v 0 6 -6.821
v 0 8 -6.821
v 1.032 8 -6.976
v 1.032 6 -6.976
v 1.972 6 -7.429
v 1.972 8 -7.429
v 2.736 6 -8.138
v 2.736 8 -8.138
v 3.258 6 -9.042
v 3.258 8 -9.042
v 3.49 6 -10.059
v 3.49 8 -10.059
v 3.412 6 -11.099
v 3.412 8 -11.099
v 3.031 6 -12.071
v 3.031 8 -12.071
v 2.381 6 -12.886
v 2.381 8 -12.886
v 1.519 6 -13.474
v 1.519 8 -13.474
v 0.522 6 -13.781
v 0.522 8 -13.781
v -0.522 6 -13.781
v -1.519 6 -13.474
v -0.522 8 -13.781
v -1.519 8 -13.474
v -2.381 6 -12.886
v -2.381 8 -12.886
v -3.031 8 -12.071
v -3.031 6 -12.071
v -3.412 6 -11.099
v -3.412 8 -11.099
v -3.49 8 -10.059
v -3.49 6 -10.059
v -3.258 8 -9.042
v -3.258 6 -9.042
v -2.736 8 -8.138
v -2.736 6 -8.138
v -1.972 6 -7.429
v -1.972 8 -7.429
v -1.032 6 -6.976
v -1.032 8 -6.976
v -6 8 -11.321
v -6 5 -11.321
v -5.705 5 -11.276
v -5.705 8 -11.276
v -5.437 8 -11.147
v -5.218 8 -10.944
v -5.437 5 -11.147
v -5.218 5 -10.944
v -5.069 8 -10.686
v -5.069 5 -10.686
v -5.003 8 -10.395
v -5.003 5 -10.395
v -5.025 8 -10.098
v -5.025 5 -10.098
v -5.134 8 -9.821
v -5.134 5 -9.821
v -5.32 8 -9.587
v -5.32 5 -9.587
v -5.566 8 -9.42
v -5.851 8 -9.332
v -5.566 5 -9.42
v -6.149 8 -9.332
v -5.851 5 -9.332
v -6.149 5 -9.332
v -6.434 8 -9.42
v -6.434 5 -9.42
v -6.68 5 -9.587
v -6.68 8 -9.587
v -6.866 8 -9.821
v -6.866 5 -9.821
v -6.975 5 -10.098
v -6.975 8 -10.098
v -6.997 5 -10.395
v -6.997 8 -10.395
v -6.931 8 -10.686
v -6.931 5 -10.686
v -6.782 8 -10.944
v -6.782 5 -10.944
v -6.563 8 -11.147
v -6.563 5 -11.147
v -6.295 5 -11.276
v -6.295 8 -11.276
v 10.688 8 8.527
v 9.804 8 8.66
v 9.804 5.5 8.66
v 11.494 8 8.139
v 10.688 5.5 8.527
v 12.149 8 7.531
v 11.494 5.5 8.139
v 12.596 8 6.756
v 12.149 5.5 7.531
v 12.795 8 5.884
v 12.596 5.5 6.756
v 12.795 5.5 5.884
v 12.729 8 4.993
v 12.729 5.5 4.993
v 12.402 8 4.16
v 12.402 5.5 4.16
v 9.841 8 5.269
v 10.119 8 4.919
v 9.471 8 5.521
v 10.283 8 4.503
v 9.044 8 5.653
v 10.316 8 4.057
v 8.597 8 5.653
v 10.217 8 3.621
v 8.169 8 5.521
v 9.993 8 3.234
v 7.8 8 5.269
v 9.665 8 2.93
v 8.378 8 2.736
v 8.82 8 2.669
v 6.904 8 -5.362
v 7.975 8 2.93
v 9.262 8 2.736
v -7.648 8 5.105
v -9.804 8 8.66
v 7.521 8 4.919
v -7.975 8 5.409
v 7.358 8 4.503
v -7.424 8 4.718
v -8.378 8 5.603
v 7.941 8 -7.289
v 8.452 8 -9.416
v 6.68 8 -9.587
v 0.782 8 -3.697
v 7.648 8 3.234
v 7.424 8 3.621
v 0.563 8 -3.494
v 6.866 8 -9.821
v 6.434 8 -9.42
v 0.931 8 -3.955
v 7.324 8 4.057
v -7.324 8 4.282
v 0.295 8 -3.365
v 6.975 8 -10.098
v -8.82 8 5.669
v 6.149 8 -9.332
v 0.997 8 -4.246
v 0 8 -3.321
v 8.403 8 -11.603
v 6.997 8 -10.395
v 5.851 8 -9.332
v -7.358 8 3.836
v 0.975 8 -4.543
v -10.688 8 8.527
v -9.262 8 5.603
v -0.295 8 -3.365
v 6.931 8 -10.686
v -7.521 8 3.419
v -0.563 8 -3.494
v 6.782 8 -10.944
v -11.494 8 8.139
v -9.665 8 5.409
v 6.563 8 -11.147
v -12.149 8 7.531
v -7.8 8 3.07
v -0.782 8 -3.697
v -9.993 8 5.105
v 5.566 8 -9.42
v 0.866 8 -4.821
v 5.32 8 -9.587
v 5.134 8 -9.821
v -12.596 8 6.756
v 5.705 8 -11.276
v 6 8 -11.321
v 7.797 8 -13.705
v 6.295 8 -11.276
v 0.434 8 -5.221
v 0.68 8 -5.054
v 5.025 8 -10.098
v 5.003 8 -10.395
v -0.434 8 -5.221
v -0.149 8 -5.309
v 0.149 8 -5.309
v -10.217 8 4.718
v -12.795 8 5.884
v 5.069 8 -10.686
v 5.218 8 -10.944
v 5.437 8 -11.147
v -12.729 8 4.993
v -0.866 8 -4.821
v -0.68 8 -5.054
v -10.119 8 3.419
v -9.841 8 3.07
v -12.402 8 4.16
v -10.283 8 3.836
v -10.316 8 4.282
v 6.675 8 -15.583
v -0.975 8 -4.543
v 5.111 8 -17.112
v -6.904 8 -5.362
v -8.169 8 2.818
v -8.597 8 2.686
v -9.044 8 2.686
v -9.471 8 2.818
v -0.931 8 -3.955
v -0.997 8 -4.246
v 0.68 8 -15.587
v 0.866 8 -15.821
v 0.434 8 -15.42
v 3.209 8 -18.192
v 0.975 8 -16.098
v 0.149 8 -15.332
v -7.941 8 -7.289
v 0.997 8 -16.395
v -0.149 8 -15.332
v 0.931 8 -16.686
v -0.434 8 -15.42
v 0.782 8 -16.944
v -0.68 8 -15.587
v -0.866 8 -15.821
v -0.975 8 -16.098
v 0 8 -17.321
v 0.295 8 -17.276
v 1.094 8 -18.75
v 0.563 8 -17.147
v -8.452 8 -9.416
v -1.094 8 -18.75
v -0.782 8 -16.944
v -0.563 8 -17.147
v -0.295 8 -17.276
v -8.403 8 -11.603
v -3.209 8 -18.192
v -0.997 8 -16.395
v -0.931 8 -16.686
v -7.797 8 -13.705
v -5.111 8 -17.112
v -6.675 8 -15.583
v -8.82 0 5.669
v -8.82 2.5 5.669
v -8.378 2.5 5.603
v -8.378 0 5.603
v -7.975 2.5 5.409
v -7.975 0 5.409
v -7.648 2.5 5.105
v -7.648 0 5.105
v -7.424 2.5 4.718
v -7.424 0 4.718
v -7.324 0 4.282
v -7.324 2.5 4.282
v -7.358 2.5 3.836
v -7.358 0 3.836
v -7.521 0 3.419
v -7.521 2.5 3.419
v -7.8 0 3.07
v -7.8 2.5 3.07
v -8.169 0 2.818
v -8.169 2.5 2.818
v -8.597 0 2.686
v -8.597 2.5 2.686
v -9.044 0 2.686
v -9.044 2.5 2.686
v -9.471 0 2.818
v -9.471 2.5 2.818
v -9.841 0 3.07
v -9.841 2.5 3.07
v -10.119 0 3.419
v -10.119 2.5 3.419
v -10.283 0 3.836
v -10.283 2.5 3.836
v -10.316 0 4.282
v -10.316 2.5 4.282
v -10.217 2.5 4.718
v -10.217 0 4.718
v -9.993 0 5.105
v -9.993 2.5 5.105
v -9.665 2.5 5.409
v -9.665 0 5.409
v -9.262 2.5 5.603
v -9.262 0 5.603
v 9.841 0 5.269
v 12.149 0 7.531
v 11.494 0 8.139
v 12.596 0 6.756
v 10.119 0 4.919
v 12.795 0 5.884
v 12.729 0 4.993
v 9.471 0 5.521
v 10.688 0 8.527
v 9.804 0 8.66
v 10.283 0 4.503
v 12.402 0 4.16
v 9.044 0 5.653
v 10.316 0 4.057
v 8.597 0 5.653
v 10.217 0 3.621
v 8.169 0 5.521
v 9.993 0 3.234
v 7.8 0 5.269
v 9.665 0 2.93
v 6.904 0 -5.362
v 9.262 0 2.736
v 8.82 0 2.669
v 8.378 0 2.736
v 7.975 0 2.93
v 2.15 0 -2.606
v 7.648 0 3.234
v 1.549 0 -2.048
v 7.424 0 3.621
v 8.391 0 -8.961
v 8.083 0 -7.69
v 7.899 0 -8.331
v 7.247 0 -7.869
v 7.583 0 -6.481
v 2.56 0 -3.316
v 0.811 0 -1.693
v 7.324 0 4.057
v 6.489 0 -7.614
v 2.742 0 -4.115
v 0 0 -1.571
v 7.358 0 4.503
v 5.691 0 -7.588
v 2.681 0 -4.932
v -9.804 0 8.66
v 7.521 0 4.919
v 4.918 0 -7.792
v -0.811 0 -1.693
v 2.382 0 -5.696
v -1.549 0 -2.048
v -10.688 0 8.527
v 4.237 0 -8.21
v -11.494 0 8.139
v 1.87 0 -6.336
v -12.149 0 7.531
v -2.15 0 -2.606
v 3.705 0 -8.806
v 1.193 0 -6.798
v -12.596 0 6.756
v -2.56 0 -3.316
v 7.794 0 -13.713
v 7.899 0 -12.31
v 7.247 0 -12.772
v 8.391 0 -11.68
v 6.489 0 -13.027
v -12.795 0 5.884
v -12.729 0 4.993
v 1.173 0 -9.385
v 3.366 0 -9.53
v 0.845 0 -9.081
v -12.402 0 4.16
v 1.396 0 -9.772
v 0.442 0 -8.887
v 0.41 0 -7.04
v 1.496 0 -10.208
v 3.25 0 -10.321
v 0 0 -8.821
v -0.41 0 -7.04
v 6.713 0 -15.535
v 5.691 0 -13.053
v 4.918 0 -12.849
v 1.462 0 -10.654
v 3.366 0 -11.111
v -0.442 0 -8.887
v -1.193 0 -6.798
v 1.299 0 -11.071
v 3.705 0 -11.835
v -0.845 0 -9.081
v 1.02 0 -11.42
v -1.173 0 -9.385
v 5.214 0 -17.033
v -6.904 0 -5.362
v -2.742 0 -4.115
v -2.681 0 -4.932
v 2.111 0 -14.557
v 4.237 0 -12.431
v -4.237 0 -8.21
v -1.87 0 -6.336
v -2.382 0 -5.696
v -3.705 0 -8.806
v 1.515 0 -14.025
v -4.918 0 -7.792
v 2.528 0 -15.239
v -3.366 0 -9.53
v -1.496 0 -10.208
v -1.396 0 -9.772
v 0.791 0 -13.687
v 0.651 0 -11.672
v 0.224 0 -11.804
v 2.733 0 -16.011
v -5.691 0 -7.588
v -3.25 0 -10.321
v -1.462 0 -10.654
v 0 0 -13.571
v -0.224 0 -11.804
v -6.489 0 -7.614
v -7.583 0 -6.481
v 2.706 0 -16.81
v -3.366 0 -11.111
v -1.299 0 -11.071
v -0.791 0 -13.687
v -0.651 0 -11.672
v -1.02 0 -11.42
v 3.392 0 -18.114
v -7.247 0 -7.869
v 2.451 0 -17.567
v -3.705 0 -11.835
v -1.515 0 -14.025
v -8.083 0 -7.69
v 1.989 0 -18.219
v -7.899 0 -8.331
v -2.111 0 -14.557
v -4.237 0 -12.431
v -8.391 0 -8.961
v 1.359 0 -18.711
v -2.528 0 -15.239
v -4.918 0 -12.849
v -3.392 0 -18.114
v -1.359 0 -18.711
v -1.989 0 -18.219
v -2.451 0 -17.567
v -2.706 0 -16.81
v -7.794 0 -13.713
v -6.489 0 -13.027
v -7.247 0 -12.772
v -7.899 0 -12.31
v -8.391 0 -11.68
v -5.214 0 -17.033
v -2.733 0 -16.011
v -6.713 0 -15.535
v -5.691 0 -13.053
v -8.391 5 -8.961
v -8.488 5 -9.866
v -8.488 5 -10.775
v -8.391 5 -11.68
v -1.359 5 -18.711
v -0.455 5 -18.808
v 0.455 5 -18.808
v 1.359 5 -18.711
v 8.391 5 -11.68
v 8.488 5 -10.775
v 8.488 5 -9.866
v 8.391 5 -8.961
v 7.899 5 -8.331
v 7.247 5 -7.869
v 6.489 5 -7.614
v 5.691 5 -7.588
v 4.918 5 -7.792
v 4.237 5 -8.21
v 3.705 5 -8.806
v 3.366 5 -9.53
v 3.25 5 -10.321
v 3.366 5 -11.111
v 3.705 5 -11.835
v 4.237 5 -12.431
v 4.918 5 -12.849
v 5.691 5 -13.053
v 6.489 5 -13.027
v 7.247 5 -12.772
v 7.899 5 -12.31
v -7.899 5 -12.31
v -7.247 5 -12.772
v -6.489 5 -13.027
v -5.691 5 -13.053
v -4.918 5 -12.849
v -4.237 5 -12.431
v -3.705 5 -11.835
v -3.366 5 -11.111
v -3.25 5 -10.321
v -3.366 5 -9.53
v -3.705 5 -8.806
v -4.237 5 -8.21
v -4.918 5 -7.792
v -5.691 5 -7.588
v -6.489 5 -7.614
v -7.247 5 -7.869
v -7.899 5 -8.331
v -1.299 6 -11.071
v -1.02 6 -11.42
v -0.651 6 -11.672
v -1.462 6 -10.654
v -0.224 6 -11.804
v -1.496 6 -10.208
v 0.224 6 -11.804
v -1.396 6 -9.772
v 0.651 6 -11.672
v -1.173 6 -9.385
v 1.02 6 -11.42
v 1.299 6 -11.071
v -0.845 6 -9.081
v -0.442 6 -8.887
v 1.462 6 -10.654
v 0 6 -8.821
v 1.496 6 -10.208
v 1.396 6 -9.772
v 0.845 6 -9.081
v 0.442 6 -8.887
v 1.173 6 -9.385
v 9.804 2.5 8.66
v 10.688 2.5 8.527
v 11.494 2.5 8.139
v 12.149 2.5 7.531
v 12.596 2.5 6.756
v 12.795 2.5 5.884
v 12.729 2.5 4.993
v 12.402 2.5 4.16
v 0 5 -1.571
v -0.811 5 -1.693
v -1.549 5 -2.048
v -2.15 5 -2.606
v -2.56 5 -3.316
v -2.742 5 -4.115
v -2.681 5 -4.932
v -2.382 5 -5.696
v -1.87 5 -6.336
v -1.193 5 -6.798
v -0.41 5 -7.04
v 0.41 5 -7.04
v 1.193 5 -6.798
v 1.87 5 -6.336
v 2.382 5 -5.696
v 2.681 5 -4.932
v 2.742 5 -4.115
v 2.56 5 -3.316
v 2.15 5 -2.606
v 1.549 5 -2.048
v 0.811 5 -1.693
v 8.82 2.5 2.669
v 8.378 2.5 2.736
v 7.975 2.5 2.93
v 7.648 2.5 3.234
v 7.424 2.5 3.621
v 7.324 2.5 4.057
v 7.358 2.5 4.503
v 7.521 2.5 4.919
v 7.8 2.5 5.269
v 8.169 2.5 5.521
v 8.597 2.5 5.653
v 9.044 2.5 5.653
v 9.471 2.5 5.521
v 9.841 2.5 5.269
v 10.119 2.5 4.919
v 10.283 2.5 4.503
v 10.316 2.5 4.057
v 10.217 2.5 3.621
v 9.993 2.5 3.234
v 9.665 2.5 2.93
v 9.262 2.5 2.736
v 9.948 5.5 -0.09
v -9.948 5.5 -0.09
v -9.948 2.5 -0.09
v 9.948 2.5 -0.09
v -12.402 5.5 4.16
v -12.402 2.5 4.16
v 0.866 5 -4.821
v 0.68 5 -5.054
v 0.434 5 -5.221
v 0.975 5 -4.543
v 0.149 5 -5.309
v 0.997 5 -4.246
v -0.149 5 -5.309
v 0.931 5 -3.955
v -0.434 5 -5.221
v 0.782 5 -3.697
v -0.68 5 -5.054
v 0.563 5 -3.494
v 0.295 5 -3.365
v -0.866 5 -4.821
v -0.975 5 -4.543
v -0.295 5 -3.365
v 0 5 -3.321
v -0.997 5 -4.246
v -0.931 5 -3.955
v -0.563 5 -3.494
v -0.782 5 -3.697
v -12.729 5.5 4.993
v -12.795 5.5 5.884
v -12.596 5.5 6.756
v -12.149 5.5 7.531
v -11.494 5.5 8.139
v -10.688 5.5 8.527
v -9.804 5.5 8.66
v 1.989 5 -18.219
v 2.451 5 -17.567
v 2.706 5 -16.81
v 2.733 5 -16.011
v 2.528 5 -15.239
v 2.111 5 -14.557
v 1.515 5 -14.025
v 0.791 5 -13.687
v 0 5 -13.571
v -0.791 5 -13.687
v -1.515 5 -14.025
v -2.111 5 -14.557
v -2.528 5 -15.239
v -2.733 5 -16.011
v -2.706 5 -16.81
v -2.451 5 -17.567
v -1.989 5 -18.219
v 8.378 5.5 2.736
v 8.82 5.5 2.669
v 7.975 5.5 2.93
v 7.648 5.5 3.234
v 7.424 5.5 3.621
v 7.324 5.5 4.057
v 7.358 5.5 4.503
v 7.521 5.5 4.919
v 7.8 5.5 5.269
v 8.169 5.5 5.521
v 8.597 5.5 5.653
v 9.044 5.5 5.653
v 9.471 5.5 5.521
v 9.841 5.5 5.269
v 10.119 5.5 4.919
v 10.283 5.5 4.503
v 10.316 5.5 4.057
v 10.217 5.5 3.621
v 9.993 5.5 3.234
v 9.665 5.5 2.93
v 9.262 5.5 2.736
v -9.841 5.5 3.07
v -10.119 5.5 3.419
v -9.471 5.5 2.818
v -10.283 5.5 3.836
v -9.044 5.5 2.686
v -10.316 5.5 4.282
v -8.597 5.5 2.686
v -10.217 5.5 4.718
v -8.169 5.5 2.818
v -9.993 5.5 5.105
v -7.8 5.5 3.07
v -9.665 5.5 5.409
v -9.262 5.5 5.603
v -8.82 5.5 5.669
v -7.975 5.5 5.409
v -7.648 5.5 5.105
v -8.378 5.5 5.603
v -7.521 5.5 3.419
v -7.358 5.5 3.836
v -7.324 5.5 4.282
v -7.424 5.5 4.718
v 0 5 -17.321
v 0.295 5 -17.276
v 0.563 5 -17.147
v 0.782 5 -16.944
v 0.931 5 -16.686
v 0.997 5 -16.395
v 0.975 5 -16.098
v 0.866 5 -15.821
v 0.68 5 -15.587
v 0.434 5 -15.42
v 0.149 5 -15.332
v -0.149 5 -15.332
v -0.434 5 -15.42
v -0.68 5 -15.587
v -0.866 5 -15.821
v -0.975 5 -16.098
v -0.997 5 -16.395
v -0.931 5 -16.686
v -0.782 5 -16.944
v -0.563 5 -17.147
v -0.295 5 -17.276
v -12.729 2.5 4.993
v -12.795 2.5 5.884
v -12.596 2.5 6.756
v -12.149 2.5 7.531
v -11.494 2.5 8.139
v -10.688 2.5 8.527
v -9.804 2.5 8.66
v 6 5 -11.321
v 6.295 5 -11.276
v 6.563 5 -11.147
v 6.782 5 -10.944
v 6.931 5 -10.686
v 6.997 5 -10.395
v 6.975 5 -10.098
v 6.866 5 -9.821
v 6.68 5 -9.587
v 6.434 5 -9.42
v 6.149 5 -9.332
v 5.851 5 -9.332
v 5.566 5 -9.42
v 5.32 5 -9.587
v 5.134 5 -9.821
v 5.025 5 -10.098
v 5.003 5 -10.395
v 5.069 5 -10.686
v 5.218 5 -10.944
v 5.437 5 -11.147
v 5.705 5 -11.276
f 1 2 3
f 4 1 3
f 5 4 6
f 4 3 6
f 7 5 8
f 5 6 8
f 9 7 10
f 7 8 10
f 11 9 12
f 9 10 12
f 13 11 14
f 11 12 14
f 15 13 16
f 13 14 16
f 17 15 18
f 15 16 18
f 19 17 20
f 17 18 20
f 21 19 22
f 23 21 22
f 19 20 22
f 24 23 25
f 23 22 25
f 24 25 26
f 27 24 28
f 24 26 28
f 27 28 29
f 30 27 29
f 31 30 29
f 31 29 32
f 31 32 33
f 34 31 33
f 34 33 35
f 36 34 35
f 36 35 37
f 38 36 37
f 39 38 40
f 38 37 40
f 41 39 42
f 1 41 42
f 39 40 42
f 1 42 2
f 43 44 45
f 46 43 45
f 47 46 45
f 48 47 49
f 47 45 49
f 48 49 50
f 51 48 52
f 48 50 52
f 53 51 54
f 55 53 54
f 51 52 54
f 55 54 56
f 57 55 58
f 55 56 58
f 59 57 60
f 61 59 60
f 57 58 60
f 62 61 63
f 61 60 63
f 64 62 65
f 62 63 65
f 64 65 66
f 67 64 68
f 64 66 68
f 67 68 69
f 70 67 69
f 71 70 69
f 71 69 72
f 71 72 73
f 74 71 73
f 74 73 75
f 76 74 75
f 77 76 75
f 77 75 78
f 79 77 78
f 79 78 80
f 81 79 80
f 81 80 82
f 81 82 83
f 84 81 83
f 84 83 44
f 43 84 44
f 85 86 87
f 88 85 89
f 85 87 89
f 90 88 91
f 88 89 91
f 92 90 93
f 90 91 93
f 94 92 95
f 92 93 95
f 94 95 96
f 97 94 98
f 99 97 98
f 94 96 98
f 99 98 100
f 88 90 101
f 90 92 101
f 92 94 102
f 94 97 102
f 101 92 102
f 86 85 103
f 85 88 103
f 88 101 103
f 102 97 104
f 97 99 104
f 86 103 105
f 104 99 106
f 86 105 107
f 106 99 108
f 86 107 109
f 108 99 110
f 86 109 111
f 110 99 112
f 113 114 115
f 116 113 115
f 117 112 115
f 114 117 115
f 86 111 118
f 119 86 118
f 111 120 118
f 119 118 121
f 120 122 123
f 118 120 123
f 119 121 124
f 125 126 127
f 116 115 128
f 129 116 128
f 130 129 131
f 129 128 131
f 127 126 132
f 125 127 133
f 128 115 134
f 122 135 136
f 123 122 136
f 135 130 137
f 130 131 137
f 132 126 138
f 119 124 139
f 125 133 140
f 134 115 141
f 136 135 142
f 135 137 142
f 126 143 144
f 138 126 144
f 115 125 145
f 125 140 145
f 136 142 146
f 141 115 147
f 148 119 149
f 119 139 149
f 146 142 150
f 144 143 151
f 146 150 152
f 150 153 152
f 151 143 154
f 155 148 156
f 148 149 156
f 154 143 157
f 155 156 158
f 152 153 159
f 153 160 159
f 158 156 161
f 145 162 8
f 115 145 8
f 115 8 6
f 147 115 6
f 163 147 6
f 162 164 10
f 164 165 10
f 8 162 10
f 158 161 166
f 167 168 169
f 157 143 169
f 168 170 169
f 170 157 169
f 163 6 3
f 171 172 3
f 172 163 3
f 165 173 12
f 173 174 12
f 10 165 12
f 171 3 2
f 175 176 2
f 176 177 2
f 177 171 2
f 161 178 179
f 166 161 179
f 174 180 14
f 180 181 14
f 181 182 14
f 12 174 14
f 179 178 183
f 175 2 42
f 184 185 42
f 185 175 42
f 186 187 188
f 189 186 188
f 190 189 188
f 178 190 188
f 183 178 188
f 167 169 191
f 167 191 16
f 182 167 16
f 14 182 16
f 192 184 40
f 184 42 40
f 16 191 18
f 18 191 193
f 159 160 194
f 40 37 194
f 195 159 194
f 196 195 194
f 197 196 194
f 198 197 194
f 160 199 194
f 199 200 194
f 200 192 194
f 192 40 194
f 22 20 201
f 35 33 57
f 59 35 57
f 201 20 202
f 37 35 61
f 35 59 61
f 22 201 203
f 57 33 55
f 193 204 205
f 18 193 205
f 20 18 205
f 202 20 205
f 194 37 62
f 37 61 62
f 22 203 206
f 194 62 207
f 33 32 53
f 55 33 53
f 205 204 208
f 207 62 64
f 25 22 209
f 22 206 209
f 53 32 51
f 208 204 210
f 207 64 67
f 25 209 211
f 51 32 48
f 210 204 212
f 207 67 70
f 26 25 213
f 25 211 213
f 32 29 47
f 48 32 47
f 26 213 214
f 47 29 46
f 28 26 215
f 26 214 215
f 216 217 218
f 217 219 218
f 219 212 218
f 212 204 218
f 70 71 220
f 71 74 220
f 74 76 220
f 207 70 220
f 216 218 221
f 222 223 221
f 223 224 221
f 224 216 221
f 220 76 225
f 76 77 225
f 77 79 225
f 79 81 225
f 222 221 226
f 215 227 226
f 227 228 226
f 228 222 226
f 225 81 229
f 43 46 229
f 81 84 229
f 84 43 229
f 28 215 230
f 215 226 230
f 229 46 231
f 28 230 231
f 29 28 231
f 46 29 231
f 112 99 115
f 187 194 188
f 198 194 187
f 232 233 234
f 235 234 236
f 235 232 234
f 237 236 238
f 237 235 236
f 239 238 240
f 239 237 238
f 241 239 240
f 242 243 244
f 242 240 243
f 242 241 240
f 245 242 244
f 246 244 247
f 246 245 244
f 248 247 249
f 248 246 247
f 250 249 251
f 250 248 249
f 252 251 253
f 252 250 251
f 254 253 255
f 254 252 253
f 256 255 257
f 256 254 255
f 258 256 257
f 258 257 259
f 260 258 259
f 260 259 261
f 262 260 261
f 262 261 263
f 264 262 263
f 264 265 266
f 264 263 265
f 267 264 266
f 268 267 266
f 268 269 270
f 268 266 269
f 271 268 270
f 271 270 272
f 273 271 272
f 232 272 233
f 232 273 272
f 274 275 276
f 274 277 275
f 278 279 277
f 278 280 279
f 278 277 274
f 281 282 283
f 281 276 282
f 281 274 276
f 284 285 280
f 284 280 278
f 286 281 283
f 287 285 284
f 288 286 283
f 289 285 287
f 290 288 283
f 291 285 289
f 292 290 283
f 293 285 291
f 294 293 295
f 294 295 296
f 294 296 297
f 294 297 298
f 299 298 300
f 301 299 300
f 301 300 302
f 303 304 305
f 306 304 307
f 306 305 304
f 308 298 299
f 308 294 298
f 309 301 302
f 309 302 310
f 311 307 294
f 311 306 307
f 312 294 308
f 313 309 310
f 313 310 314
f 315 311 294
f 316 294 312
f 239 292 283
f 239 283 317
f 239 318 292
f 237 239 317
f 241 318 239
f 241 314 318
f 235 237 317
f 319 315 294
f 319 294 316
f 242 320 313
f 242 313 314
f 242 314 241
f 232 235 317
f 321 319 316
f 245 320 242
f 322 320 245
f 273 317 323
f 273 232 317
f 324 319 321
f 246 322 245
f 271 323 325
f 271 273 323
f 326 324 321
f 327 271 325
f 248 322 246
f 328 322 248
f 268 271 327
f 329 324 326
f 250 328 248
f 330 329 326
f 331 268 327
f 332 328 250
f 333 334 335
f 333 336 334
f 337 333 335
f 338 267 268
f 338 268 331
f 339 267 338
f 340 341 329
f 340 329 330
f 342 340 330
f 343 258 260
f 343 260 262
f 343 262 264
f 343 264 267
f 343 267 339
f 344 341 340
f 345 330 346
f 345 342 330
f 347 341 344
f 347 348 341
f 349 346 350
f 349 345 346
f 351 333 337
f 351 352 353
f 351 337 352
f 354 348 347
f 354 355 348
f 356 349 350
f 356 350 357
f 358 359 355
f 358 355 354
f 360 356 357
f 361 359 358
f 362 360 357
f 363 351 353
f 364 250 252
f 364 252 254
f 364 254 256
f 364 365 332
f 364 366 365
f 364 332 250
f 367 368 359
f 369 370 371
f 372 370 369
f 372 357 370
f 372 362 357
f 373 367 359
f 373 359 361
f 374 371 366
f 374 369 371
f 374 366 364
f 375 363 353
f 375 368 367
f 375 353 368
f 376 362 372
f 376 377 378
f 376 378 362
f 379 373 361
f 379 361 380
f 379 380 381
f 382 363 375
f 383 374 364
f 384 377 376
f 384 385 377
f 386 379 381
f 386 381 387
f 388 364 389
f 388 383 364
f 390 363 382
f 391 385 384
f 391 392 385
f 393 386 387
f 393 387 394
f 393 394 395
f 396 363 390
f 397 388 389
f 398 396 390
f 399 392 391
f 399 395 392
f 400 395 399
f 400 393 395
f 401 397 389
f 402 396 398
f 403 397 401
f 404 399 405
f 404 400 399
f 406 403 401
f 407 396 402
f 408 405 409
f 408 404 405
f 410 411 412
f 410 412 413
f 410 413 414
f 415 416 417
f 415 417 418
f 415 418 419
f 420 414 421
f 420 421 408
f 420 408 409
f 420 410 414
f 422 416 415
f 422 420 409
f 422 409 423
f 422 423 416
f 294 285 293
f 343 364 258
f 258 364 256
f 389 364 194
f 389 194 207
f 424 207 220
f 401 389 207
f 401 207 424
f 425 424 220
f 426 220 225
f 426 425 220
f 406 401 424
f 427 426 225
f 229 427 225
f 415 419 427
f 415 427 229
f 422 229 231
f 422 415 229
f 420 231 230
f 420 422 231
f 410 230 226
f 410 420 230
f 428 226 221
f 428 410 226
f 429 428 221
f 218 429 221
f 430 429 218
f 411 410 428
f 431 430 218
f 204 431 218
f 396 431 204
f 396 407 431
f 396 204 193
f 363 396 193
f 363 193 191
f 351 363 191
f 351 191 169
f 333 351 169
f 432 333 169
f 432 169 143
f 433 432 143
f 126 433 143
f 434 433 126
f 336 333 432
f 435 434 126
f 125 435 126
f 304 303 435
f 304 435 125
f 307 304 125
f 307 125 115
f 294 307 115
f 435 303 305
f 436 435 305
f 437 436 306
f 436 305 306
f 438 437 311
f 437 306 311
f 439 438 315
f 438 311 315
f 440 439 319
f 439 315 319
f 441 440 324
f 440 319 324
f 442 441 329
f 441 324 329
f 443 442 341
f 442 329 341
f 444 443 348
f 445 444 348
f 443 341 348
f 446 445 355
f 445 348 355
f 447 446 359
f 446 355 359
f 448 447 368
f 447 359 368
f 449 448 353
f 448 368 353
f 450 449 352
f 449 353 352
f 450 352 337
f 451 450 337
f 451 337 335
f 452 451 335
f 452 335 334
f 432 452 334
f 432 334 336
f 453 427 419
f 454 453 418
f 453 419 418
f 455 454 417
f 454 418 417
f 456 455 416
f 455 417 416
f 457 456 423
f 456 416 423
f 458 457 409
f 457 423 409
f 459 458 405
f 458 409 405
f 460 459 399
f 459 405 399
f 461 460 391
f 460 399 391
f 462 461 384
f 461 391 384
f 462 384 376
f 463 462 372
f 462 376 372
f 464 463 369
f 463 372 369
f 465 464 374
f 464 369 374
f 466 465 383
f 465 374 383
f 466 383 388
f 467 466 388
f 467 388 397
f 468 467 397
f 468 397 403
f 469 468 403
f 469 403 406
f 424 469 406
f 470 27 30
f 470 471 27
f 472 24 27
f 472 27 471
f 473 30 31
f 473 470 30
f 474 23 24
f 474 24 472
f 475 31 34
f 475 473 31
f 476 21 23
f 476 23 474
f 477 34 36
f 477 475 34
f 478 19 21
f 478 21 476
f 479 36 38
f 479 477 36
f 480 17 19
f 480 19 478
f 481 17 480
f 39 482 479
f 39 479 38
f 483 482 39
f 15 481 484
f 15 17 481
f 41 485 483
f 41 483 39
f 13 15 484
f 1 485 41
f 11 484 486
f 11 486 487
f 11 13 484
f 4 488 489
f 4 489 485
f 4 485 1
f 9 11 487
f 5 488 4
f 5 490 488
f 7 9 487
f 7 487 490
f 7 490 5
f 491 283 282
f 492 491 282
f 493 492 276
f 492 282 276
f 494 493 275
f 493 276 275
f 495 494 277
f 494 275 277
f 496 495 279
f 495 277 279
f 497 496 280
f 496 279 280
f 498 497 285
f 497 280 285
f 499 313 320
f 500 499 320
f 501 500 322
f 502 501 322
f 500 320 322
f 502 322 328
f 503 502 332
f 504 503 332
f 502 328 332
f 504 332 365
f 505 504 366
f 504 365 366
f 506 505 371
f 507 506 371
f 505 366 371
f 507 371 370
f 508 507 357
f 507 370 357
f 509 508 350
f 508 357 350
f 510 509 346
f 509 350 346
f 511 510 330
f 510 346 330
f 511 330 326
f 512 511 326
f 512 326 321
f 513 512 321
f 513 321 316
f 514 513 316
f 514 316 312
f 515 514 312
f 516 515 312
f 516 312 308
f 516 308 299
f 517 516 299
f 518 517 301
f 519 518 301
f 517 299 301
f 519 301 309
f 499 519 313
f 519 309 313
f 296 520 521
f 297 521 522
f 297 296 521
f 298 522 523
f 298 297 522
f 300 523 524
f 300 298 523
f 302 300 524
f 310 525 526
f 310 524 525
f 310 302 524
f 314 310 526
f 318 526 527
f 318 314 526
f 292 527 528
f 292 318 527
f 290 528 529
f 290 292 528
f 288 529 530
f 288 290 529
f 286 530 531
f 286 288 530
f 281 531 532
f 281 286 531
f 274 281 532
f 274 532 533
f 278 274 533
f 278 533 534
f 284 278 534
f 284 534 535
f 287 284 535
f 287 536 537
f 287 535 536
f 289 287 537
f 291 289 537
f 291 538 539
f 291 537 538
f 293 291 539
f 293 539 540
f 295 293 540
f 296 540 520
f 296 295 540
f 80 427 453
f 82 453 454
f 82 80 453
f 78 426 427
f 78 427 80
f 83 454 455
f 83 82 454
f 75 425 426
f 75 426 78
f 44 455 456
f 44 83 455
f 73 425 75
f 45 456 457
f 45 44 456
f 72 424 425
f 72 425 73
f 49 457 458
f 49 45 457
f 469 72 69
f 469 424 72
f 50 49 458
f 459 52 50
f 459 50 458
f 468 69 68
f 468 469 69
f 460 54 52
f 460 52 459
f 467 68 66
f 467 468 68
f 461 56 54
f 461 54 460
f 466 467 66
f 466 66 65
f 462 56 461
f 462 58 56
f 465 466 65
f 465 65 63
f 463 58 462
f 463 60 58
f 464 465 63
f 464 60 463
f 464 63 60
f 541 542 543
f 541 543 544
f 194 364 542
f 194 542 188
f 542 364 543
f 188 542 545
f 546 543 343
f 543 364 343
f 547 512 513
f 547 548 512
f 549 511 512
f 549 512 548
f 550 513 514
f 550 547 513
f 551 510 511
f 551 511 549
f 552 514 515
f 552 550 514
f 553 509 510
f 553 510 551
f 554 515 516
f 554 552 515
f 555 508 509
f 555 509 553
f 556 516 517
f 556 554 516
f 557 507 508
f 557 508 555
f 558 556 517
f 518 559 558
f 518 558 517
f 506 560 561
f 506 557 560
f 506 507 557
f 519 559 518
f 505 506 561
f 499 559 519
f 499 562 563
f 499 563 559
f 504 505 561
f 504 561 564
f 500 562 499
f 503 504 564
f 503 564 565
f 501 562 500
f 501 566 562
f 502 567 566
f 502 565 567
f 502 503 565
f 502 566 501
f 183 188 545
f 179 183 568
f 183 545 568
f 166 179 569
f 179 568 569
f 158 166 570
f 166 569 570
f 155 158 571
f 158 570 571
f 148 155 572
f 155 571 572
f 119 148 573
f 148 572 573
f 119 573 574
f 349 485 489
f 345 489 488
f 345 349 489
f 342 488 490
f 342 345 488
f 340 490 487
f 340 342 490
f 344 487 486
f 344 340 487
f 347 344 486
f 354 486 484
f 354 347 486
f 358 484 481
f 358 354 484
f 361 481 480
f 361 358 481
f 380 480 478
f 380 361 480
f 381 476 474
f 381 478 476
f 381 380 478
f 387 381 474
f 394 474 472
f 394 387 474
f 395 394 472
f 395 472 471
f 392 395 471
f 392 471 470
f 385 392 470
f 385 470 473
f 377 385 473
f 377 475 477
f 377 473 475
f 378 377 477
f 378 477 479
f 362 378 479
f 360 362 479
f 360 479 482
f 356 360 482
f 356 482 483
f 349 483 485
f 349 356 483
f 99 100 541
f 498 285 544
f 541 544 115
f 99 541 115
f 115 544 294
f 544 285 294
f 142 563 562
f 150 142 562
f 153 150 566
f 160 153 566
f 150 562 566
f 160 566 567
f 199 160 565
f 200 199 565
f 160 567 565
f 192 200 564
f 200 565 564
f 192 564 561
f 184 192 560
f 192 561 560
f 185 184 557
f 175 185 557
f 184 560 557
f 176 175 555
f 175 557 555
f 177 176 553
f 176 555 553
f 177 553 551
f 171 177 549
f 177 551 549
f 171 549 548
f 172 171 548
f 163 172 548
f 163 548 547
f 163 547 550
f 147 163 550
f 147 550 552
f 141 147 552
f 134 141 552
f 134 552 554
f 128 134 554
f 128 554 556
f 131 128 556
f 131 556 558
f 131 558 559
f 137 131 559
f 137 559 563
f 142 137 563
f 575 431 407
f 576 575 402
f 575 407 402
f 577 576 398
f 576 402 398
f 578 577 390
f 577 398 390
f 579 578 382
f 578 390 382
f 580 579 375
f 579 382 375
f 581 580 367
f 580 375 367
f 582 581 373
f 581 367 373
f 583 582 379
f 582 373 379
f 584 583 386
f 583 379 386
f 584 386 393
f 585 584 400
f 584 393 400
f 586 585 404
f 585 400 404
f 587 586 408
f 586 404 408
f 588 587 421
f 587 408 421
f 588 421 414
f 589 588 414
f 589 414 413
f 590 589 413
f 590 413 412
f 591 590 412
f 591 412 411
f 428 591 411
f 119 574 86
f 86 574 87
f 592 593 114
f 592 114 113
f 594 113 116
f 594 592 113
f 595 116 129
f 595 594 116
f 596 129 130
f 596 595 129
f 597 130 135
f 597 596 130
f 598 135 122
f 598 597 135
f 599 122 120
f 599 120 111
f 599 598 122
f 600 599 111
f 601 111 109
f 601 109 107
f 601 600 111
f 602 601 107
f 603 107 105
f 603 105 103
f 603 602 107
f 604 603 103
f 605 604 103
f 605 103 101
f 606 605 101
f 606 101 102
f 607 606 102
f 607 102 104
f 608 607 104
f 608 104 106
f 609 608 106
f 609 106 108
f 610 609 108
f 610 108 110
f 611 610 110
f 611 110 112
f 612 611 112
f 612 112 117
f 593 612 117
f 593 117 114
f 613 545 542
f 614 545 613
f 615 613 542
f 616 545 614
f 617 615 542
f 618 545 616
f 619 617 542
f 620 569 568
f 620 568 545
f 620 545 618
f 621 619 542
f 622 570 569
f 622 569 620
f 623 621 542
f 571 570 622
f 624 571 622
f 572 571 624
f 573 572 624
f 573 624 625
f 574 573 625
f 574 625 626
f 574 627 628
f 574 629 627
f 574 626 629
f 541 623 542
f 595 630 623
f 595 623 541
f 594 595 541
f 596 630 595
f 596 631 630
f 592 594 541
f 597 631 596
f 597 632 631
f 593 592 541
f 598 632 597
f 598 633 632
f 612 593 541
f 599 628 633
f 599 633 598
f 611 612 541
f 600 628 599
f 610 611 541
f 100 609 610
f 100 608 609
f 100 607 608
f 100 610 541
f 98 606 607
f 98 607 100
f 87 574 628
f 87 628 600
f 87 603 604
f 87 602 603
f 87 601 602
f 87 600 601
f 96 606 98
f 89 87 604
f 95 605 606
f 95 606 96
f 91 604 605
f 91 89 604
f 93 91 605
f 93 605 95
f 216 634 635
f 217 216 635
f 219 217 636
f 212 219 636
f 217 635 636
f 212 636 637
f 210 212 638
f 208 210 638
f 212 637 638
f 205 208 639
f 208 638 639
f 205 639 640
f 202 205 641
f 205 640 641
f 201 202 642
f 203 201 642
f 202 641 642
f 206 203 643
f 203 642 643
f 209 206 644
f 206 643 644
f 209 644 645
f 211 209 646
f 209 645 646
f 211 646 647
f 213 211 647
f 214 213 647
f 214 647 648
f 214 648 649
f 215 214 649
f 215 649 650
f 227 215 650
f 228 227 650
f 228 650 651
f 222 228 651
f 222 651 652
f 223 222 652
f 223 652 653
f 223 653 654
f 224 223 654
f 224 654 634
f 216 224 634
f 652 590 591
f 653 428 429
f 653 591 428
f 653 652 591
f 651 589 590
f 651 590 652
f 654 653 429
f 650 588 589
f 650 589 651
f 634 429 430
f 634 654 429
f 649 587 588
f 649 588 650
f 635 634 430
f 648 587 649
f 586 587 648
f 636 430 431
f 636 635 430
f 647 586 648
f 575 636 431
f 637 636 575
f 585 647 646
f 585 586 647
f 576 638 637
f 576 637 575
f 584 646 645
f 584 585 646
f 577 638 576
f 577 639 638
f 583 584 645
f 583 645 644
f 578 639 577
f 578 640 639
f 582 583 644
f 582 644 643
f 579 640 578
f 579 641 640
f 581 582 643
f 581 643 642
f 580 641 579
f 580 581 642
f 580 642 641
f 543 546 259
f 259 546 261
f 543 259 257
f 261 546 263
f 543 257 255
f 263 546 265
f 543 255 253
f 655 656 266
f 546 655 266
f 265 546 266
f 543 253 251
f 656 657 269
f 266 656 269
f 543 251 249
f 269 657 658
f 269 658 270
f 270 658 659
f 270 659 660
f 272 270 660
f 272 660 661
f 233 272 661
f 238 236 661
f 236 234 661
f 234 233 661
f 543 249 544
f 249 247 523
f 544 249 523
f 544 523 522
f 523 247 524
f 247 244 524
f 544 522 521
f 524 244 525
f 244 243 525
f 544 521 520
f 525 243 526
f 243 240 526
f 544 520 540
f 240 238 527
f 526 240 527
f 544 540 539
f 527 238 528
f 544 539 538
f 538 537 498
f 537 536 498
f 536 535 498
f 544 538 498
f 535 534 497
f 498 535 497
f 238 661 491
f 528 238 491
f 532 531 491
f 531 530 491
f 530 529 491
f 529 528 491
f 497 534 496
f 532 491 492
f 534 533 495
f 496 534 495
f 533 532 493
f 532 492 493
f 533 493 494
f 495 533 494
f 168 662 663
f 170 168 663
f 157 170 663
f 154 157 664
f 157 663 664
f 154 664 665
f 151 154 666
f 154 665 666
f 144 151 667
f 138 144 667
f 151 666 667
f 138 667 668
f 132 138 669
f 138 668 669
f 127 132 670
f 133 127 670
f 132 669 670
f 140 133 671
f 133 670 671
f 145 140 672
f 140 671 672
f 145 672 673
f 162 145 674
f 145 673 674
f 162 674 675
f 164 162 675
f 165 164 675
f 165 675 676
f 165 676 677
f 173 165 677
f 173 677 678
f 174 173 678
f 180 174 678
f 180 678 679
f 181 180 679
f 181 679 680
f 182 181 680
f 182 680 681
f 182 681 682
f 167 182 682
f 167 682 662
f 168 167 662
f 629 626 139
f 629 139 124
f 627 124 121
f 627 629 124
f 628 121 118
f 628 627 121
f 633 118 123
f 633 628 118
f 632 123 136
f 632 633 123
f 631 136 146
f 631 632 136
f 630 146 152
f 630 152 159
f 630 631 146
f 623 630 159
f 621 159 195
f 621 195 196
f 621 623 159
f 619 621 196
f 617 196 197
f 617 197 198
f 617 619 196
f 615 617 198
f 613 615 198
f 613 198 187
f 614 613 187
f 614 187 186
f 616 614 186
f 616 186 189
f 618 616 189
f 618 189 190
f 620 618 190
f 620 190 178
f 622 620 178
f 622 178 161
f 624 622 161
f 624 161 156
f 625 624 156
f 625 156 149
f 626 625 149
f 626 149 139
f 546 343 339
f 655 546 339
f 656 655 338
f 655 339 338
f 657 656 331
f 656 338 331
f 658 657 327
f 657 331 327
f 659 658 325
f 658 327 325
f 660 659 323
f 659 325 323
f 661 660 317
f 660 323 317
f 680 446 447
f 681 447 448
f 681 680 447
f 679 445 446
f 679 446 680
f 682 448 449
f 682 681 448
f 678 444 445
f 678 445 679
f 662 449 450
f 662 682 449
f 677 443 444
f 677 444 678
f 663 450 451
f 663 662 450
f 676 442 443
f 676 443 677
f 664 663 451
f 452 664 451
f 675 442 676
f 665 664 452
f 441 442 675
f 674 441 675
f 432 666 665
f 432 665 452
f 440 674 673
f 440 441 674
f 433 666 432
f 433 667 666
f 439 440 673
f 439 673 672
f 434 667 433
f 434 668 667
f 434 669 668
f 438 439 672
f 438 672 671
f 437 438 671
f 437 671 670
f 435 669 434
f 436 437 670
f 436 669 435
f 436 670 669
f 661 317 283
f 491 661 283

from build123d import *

# Parameters (mm, degrees)
SKETCH1_R           = 1.5
BOSS_EXTRUDE1_DEPTH = 8
SKETCH2_W           = 26.485934179
SKETCH2_H           = 3
CUT_EXTRUDE3_DEPTH  = 8.75
SKETCH3_R           = 8.5
SKETCH3_R_2         = 1.5
SKETCH3_R_3         = 1
BOSS_EXTRUDE2_DEPTH = 8
SKETCH4_R           = 2.75
CUT_EXTRUDE4_DEPTH  = 5
SKETCH5_R           = 3.5
CUT_EXTRUDE5_DEPTH  = 2
SKETCH3_3_R         = 1
CUT_EXTRUDE6_DEPTH  = 32


with BuildPart() as part:
    # Sketch1 → Boss-Extrude1 (new body)
    with BuildSketch(Plane(origin=(0, 0, 0), x_dir=(1, 0, 0), z_dir=(0, 1, 0))):
        with BuildLine():
            Line((-2.598076211, 12.820508076), (-12.401923789, -4.160254038))
            ThreePointArc((-12.401923789, -4.160254038), (-12.401923789, -7.160254038), (-9.803847577, -8.660254038))
            Line((-9.803847577, -8.660254038), (9.803847577, -8.660254038))
            ThreePointArc((9.803847577, -8.660254038), (12.401923789, -7.160254038), (12.401923789, -4.160254038))
            Line((12.401923789, -4.160254038), (2.598076211, 12.820508076))
            ThreePointArc((2.598076211, 12.820508076), (0, 14.320508076), (-2.598076211, 12.820508076))
        make_face()
        with Locations(Location((0, 10.320508076, 0), (0, 0, 270))):
            Circle(SKETCH1_R, mode=Mode.SUBTRACT)
        with Locations(Location((-8.82025404, -4.169491924, 0), (0, 0, 270))):
            Circle(SKETCH1_R, mode=Mode.SUBTRACT)
        with Locations(Location((8.82025404, -4.169491924, 0), (0, 0, 90))):
            Circle(SKETCH1_R, mode=Mode.SUBTRACT)
    extrude(amount=BOSS_EXTRUDE1_DEPTH)

    # Sketch2 → Cut-Extrude3 (cut)
    with BuildSketch(Plane.XY.offset(8.660254038)):
        with Locations((0.054095799, 4)):
            Rectangle(SKETCH2_W, SKETCH2_H)
    extrude(amount=-CUT_EXTRUDE3_DEPTH, mode=Mode.SUBTRACT)

    # Sketch3 → Boss-Extrude2 (add)
    with BuildSketch(Plane(origin=(0, 0, 0), x_dir=(-1, 0, 0), z_dir=(0, -1, 0))):
        with Locations((0, 10.320508076)):
            Circle(SKETCH3_R)
        with Locations(Location((0, 10.320508076, 0), (0, 0, 270))):
            Circle(SKETCH3_R_2, mode=Mode.SUBTRACT)
        with Locations(Location((-6, 10.320508076, 0), (0, 0, 90))):
            Circle(SKETCH3_R_3, mode=Mode.SUBTRACT)
        with Locations(Location((6, 10.320508076, 0), (0, 0, 90))):
            Circle(SKETCH3_R_3, mode=Mode.SUBTRACT)
        with Locations(Location((0, 16.320508076, 0), (0, 0, 90))):
            Circle(SKETCH3_R_3, mode=Mode.SUBTRACT)
        with Locations((0, 4.320508076)):
            Circle(SKETCH3_R_3, mode=Mode.SUBTRACT)
    extrude(amount=-BOSS_EXTRUDE2_DEPTH)

    # Sketch4 → Cut-Extrude4 (cut)
    with BuildSketch(Plane.XZ):
        with Locations((-6, -10.320508076)):
            Circle(SKETCH4_R)
        with Locations((6, -10.320508076)):
            Circle(SKETCH4_R)
        with Locations((0, -16.320508076)):
            Circle(SKETCH4_R)
        with Locations(Location((0, -4.320508076, 0), (0, 0, 90))):
            Circle(SKETCH4_R)
    extrude(amount=-CUT_EXTRUDE4_DEPTH, mode=Mode.SUBTRACT)

    # Sketch5 → Cut-Extrude5 (cut)
    with BuildSketch(Plane(origin=(0, 8, 0), x_dir=(1, 0, 0), z_dir=(0, 1, 0))):
        with Locations(Location((0, 10.320508076, 0), (0, 0, 270))):
            Circle(SKETCH5_R)
    extrude(amount=-CUT_EXTRUDE5_DEPTH, mode=Mode.SUBTRACT)

    # Sketch3<3> → Cut-Extrude6 (cut)
    with BuildSketch(Plane(origin=(0, 0, 0), x_dir=(-1, 0, 0), z_dir=(0, -1, 0))):
        with Locations(Location((0, 4.320508076, 0), (0, 0, 270))):
            Circle(SKETCH3_3_R)
    extrude(amount=-CUT_EXTRUDE6_DEPTH, mode=Mode.SUBTRACT)


solid = part.part
